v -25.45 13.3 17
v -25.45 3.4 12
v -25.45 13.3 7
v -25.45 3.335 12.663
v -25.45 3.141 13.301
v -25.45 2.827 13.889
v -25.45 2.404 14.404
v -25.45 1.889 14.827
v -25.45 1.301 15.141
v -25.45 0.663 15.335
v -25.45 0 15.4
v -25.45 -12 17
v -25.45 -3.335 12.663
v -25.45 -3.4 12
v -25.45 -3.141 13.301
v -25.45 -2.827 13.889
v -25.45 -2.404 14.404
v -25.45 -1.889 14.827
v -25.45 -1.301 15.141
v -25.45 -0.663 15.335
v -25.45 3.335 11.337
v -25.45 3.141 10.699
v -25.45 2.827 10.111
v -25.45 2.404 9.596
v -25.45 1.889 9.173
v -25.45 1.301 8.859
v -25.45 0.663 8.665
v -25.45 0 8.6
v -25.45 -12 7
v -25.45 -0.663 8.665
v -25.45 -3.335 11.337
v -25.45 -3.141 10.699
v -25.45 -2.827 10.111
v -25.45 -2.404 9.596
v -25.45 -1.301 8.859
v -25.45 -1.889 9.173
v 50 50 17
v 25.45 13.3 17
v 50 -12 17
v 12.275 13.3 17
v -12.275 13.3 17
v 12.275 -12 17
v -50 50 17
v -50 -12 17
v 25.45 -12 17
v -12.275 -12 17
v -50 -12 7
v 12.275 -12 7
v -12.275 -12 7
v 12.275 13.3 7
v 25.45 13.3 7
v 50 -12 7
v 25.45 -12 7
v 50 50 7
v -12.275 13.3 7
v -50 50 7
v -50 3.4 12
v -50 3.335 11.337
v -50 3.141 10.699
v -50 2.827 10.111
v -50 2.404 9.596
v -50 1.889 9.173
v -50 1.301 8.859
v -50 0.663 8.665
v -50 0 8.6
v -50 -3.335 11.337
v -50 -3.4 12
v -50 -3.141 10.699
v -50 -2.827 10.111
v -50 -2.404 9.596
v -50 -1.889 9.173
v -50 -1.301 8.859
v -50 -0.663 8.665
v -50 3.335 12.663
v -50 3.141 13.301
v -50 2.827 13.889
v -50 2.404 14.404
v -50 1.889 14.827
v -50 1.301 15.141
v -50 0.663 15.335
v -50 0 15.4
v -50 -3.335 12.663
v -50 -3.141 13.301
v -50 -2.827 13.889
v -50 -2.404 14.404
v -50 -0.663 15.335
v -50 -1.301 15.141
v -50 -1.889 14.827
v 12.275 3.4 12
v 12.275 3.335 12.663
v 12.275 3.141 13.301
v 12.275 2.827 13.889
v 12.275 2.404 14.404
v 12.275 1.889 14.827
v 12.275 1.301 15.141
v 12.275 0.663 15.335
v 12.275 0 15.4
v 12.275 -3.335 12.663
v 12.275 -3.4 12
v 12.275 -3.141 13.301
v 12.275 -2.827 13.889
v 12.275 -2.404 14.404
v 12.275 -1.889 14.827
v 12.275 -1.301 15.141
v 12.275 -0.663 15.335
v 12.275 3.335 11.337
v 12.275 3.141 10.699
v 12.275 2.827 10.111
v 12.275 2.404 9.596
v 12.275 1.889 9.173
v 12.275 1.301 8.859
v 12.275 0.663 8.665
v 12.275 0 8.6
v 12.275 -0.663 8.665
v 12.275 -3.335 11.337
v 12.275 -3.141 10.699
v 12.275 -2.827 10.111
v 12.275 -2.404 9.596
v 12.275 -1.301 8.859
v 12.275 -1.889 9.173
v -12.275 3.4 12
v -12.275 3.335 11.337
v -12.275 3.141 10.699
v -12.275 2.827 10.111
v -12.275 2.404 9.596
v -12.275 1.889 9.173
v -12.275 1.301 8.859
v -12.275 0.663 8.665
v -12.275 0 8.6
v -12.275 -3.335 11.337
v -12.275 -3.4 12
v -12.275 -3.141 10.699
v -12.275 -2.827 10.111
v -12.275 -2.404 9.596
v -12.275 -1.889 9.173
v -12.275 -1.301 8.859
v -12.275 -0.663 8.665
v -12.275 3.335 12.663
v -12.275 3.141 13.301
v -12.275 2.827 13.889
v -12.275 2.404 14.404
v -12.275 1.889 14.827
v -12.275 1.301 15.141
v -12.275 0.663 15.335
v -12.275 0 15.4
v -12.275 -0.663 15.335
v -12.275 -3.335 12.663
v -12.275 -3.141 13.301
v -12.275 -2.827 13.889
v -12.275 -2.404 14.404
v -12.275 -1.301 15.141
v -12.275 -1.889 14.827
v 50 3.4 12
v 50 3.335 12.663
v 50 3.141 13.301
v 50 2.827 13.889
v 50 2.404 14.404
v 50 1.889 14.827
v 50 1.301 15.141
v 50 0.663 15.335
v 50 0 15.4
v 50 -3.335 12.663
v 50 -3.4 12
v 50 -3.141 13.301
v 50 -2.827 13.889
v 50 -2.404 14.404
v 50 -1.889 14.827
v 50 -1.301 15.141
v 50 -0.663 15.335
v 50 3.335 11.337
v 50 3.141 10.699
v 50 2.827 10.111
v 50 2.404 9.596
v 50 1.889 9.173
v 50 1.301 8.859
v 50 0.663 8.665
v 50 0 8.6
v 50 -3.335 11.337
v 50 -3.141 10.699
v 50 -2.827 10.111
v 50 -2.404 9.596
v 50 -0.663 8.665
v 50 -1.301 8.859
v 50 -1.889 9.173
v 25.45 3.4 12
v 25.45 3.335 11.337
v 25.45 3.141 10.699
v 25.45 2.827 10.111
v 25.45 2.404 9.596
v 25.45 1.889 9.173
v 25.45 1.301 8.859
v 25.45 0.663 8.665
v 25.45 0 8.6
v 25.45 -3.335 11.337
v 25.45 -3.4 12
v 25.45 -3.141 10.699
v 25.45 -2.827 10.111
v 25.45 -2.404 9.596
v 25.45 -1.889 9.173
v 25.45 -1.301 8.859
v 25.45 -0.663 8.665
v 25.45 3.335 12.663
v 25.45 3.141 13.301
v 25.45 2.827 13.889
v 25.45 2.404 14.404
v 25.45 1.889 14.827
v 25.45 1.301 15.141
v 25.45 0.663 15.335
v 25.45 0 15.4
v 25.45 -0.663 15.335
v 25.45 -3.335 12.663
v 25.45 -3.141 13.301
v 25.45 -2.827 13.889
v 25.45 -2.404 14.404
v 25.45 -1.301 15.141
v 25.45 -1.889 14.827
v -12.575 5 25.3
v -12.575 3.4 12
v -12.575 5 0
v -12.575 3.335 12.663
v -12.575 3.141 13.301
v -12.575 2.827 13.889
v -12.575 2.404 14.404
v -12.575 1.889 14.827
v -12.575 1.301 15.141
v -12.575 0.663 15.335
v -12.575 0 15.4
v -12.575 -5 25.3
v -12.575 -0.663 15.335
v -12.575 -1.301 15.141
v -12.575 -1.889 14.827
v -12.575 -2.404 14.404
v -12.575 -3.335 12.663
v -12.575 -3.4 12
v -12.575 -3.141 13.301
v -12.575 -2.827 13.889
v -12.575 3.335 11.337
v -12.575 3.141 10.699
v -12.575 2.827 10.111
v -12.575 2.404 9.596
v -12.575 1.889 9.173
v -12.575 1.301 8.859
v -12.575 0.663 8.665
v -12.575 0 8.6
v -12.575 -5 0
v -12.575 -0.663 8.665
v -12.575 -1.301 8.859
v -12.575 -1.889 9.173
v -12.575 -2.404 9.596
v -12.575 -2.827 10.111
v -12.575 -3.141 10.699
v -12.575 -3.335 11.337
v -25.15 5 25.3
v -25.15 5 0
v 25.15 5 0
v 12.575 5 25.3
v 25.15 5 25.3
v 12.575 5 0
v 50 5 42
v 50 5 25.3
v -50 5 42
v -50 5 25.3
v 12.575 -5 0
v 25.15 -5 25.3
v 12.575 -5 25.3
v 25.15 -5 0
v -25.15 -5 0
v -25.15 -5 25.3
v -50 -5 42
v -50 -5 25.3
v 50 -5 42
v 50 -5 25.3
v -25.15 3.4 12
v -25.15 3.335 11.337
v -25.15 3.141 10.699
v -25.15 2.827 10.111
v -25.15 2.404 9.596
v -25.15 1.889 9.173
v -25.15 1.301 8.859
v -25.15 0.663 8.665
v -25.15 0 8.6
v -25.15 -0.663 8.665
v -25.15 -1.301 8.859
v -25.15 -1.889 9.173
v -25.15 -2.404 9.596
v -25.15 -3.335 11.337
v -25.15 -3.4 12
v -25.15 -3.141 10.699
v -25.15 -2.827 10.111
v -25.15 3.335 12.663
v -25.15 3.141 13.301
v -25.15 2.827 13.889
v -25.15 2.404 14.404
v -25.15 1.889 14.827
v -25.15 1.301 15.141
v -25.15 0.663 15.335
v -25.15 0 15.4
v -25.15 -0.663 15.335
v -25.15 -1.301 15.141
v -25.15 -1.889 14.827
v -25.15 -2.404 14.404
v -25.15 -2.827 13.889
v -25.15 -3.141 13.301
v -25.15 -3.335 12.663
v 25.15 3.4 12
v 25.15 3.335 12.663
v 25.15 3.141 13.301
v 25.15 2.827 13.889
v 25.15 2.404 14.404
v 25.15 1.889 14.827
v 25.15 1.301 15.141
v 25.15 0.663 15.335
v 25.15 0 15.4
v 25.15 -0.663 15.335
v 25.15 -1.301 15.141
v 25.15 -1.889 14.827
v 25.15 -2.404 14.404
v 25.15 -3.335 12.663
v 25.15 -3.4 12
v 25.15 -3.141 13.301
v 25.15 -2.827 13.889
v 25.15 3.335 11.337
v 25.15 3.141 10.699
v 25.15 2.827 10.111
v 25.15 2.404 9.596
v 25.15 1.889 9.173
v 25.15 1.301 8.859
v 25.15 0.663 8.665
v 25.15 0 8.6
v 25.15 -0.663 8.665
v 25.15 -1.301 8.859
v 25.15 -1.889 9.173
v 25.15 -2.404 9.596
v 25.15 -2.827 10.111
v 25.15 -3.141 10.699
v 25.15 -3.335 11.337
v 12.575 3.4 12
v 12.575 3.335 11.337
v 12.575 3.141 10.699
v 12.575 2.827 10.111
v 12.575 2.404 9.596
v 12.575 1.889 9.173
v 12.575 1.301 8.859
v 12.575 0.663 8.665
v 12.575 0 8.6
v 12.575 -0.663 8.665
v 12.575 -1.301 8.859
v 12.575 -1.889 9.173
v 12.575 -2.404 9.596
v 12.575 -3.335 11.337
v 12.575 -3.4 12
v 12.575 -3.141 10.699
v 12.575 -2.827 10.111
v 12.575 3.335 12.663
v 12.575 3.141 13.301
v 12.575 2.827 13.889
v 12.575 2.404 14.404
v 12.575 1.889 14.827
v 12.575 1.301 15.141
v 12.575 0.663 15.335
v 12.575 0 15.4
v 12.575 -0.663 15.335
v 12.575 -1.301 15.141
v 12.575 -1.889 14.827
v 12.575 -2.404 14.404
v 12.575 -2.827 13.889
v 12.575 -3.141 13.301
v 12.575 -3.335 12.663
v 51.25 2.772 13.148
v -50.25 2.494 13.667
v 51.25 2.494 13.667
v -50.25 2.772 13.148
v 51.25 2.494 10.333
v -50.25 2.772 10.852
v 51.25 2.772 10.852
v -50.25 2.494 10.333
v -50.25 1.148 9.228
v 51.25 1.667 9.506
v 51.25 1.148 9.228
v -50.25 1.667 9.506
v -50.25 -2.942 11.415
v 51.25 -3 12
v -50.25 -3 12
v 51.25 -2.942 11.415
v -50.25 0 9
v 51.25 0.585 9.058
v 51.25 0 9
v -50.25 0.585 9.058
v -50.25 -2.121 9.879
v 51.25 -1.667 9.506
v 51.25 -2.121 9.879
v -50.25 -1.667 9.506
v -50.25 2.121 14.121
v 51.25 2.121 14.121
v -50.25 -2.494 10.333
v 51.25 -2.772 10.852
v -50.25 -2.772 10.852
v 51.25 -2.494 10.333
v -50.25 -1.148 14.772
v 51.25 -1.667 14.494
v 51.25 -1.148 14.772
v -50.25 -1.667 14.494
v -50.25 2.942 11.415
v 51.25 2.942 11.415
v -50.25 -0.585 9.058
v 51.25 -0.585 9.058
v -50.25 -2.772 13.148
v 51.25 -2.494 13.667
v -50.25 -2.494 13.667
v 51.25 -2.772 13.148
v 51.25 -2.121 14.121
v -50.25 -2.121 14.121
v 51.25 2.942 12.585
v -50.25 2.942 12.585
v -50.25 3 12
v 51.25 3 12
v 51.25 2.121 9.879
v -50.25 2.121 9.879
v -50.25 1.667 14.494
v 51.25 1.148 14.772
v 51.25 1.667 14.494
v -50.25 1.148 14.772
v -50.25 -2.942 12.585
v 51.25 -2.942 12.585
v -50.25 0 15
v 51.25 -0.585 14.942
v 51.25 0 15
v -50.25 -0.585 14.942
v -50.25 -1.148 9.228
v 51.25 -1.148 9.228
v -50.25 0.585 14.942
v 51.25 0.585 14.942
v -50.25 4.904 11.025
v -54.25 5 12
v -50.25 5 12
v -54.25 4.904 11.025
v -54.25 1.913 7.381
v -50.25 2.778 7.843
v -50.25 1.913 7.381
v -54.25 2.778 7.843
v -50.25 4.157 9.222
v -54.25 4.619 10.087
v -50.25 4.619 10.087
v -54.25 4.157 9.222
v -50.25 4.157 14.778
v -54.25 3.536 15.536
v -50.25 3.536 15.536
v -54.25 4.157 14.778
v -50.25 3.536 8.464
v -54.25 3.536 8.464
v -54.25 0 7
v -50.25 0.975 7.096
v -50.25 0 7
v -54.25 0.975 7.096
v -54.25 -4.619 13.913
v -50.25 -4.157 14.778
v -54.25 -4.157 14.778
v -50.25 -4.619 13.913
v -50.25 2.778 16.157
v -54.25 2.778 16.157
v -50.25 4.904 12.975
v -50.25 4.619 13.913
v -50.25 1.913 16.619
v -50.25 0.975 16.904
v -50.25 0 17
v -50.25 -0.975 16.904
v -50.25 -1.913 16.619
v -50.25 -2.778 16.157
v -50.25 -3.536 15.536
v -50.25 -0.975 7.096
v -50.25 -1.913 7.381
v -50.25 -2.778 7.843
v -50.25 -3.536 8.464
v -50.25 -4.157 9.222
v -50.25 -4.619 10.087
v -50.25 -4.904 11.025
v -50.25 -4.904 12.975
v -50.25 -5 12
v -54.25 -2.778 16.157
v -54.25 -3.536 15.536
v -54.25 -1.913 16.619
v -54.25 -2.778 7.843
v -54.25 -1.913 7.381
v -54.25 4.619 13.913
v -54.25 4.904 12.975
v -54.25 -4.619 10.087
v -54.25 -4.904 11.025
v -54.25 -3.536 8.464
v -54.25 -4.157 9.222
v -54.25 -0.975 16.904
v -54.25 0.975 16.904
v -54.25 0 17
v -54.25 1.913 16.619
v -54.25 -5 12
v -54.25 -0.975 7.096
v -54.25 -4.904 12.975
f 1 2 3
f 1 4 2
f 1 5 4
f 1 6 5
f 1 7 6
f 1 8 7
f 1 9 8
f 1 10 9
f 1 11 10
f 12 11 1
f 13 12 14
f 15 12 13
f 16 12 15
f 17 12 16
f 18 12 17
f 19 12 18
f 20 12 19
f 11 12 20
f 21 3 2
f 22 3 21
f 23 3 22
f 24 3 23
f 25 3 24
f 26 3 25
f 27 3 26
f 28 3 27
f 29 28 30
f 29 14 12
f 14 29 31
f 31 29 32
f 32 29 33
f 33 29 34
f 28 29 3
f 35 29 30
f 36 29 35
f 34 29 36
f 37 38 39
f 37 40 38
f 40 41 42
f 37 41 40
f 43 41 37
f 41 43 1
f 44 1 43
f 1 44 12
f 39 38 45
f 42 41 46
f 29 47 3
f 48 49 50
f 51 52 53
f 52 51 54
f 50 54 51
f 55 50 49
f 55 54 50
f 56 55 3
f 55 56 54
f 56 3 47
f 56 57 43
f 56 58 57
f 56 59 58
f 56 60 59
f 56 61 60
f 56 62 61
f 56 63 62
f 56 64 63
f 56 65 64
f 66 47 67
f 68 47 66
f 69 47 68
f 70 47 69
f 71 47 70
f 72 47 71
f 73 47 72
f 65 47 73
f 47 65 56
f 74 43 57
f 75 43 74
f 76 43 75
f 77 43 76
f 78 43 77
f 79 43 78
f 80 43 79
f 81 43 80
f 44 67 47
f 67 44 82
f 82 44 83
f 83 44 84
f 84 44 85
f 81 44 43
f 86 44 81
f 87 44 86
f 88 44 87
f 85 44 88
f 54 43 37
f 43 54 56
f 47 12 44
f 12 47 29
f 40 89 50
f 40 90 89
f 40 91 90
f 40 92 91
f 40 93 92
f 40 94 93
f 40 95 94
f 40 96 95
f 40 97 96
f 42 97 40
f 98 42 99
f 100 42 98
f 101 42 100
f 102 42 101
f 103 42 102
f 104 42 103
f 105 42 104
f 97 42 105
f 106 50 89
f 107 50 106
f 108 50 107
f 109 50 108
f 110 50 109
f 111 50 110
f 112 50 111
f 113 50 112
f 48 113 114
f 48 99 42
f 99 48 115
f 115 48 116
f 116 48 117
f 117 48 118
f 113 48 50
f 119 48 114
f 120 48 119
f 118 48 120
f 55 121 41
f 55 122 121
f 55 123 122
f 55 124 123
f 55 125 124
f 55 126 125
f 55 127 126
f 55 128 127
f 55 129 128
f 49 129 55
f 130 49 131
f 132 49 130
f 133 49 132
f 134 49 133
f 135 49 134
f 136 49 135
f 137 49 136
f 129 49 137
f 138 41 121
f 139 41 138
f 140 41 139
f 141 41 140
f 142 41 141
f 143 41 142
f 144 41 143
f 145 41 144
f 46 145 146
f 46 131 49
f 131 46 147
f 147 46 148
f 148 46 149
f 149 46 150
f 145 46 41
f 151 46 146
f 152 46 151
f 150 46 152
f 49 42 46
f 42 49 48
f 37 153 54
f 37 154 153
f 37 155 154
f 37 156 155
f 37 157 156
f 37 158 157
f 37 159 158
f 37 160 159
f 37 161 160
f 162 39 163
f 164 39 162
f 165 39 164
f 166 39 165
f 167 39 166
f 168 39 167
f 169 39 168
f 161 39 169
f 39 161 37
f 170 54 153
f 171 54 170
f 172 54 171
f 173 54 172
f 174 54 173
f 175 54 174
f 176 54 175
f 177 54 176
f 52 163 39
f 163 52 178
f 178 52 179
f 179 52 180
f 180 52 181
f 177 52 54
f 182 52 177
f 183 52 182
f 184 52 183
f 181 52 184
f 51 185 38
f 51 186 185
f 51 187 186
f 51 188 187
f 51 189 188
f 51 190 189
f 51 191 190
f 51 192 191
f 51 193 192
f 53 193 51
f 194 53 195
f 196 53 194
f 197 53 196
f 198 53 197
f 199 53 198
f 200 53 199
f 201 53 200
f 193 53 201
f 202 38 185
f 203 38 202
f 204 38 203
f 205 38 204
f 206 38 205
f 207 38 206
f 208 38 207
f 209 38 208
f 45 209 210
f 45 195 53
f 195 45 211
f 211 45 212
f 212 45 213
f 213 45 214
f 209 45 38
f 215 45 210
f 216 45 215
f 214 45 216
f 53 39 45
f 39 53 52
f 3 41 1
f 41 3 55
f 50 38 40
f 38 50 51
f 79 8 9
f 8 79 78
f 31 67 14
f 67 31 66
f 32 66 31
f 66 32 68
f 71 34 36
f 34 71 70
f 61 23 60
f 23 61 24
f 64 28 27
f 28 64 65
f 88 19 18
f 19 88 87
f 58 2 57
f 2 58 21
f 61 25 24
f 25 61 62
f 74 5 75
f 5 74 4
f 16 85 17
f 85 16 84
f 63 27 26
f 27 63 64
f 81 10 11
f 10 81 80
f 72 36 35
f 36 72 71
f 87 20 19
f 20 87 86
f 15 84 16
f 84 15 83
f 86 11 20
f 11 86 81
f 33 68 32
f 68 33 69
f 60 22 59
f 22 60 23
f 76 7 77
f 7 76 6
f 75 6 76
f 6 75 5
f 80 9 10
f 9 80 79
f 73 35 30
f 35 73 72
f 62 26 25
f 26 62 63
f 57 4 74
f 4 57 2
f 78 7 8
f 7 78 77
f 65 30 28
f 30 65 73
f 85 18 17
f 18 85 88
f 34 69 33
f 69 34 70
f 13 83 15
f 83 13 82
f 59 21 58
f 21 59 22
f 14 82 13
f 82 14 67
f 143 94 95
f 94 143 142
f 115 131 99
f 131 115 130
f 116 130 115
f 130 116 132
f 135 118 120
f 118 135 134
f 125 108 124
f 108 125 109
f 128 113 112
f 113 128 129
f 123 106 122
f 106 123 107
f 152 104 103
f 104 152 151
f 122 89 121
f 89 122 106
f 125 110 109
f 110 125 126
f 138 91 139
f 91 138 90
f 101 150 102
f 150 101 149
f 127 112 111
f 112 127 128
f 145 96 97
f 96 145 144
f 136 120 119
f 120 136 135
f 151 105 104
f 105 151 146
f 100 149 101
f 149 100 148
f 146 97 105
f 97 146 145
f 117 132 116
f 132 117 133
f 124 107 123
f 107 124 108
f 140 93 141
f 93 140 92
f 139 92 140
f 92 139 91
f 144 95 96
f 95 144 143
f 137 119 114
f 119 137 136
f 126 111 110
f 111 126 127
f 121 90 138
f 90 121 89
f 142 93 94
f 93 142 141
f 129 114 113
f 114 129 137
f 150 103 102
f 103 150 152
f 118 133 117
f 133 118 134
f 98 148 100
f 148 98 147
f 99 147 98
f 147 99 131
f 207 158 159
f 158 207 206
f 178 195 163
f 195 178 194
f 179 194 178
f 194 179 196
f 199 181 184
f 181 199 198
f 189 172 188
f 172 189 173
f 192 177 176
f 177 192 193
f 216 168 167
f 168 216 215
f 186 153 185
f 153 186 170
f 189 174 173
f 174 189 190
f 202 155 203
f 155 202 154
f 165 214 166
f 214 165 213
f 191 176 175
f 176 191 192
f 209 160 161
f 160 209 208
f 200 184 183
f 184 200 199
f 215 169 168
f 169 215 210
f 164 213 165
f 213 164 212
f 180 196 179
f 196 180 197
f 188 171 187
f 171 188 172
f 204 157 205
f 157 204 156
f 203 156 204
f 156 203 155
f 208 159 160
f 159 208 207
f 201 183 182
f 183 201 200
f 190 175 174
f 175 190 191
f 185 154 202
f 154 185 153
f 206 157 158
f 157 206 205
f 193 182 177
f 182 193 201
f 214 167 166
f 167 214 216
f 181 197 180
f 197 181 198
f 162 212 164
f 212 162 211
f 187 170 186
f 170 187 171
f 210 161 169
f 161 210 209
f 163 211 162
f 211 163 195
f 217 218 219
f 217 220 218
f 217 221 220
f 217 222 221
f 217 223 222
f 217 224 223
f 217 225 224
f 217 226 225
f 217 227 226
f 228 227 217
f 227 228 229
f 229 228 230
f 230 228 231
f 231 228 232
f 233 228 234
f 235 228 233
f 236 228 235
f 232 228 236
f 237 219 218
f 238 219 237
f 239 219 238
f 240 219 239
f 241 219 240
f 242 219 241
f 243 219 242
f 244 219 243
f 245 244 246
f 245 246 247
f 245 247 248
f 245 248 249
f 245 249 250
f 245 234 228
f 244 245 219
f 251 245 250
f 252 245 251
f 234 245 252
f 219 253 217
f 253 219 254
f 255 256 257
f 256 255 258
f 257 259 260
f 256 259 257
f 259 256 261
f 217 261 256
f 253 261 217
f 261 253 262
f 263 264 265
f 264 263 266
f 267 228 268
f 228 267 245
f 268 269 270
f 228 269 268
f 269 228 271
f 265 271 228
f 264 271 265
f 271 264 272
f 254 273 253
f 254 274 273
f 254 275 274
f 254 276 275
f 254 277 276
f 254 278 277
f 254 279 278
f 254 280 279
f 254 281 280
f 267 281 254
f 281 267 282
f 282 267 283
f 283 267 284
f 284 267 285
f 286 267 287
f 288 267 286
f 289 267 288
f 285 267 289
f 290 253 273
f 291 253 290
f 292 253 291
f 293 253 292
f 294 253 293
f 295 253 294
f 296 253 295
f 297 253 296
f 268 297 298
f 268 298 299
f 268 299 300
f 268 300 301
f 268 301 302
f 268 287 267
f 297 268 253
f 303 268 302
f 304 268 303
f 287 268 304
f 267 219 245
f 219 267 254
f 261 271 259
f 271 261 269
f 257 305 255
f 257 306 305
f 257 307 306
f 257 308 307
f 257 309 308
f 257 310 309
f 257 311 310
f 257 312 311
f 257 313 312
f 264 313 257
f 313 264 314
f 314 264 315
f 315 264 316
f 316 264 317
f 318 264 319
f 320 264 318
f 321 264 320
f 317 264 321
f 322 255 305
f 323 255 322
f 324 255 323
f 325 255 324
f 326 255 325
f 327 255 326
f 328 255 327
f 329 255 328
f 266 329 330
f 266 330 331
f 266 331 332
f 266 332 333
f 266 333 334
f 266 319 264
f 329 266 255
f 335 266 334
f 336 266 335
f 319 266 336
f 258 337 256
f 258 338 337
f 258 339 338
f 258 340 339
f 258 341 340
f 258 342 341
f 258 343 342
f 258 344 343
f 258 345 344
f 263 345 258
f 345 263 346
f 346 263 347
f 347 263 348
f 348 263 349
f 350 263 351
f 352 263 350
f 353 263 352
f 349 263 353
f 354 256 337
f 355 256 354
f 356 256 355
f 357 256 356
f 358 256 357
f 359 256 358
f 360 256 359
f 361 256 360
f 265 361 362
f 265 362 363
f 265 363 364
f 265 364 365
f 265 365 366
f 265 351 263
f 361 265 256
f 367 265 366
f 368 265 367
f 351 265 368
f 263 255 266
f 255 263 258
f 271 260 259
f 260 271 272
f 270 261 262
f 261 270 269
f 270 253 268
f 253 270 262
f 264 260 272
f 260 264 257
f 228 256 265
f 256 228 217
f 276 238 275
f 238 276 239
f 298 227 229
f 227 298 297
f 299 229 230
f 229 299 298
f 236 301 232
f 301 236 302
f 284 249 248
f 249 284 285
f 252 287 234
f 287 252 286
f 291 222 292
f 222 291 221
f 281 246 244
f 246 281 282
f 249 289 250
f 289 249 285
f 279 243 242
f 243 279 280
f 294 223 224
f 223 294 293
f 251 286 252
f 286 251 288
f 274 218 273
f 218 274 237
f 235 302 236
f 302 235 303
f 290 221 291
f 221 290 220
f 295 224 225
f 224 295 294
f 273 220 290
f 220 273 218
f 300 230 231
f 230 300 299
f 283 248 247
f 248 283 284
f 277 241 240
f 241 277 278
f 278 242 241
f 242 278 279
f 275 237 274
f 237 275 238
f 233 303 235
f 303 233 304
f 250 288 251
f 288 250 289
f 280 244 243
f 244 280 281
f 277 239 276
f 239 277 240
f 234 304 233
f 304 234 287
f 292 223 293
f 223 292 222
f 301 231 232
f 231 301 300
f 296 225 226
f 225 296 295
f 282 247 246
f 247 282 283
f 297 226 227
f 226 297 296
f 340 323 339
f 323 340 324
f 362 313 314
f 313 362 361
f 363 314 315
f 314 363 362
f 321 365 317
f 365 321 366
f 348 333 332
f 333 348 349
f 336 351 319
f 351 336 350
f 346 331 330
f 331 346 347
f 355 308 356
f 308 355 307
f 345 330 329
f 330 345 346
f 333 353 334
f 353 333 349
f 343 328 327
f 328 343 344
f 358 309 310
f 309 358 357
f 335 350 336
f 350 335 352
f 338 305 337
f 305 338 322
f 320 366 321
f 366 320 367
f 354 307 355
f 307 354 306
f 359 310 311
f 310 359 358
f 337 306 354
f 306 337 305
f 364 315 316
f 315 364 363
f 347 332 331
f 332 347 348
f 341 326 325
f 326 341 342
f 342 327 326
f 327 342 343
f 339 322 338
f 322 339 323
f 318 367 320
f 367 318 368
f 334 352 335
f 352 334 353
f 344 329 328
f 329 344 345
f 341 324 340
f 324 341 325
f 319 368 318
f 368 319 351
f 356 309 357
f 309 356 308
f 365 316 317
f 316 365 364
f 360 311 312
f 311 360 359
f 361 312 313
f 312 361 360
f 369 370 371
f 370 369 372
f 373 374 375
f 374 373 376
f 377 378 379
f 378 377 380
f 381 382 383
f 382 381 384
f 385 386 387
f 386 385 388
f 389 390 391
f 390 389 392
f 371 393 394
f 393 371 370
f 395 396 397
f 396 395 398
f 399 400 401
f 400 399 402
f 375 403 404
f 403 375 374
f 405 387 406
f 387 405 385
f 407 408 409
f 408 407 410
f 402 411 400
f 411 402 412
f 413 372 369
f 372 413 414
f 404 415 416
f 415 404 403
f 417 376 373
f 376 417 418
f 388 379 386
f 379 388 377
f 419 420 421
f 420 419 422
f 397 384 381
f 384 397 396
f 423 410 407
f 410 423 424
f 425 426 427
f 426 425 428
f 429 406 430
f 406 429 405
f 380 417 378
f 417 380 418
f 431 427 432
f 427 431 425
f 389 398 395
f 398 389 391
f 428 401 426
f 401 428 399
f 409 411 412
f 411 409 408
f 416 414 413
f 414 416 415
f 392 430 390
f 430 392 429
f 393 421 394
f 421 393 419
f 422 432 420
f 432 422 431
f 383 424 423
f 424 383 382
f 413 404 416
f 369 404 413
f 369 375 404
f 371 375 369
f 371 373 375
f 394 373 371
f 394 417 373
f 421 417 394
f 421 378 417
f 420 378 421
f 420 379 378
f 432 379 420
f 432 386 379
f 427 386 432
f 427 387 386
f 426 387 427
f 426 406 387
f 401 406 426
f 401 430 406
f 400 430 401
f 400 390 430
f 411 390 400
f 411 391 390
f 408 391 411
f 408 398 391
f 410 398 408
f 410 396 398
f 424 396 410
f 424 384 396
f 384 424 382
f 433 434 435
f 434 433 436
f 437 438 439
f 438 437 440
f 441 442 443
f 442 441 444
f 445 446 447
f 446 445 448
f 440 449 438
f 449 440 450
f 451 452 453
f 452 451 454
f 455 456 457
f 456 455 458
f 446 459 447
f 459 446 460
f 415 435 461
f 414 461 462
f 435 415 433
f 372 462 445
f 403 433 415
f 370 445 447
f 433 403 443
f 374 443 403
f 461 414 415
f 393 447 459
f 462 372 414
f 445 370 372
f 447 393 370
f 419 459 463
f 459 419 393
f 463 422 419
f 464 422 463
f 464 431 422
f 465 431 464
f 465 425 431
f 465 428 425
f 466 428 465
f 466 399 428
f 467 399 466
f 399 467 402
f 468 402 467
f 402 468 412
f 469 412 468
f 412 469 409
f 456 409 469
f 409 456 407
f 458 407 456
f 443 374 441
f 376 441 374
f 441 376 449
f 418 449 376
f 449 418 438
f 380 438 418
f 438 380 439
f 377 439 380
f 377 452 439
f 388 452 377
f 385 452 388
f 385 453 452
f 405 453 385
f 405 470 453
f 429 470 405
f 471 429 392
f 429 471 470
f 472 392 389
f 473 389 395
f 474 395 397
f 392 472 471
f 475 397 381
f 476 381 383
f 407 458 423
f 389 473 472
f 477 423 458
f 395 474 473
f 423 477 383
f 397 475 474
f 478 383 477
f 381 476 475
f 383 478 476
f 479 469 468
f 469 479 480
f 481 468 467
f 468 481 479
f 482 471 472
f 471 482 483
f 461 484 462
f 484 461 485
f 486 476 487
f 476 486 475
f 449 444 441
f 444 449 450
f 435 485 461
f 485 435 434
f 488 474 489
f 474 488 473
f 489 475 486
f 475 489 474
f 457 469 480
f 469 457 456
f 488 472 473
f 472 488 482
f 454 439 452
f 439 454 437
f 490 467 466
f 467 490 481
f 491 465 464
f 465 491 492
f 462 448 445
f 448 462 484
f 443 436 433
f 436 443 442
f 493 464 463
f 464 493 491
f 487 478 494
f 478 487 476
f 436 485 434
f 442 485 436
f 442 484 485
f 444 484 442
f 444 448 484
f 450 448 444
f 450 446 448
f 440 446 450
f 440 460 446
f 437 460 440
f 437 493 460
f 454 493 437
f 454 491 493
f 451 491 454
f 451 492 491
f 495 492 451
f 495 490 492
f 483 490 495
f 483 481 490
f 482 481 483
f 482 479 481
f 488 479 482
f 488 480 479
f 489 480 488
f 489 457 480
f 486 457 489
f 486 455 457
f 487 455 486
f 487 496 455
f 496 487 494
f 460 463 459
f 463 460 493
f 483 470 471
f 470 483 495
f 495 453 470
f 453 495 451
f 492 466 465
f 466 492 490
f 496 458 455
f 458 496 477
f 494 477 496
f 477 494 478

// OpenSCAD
$fn = 32;

// ------------------------------------------------------------------------
// Butt hinge: hinge 100 mm, leaf swung 270 deg
// Every part is its own module, assembly() places every instance.
// ------------------------------------------------------------------------

// --- part 1 ---
module hinge_base() {
  difference() {
    union() {
      translate([-50, -12, -5]) cube([24.55, 62, 10]);
      translate([-12.275, -12, -5]) cube([24.55, 62, 10]);
      translate([25.45, -12, -5]) cube([24.55, 62, 10]);
      translate([-50, 13.3, -5]) cube([100, 36.7, 10]);
    }
    translate([-37.725, 0, 0]) rotate([0, 90, 0]) cylinder(h = 26.55, d = 6.8, center = true);
    translate([0, 0, 0]) rotate([0, 90, 0]) cylinder(h = 26.55, d = 6.8, center = true);
    translate([37.725, 0, 0]) rotate([0, 90, 0]) cylinder(h = 26.55, d = 6.8, center = true);
  }
}

// --- part 2 ---
module hinge_mover() {
  difference() {
    union() {
      translate([-25.15, -30, -5]) cube([12.575, 42, 10]);
      translate([12.575, -30, -5]) cube([12.575, 42, 10]);
      translate([-50, -30, -5]) cube([100, 16.7, 10]);
    }
    translate([-18.863, 0, 0]) rotate([0, 90, 0]) cylinder(h = 14.575, d = 6.8, center = true);
    translate([18.863, 0, 0]) rotate([0, 90, 0]) cylinder(h = 14.575, d = 6.8, center = true);
  }
}

// --- part 3 ---
module hinge_pin() {
  rotate([0, 90, 0]) cylinder(h = 102.5, d = 6, center = true);
  translate([-54.25, 0, 0]) rotate([0, 90, 0]) cylinder(h = 4, d = 10);
}

// --- assembly ---
module assembly() {
  color([0.80, 0.24, 0.20]) translate([0, 0, 12]) rotate([0, 0, 0]) hinge_base();
  color([0.20, 0.45, 0.75]) translate([0, 0, 12]) rotate([270, 0, 0]) hinge_mover();
  color([0.25, 0.62, 0.32]) translate([0, 0, 12]) rotate([0, 0, 0]) hinge_pin();
}

assembly();
